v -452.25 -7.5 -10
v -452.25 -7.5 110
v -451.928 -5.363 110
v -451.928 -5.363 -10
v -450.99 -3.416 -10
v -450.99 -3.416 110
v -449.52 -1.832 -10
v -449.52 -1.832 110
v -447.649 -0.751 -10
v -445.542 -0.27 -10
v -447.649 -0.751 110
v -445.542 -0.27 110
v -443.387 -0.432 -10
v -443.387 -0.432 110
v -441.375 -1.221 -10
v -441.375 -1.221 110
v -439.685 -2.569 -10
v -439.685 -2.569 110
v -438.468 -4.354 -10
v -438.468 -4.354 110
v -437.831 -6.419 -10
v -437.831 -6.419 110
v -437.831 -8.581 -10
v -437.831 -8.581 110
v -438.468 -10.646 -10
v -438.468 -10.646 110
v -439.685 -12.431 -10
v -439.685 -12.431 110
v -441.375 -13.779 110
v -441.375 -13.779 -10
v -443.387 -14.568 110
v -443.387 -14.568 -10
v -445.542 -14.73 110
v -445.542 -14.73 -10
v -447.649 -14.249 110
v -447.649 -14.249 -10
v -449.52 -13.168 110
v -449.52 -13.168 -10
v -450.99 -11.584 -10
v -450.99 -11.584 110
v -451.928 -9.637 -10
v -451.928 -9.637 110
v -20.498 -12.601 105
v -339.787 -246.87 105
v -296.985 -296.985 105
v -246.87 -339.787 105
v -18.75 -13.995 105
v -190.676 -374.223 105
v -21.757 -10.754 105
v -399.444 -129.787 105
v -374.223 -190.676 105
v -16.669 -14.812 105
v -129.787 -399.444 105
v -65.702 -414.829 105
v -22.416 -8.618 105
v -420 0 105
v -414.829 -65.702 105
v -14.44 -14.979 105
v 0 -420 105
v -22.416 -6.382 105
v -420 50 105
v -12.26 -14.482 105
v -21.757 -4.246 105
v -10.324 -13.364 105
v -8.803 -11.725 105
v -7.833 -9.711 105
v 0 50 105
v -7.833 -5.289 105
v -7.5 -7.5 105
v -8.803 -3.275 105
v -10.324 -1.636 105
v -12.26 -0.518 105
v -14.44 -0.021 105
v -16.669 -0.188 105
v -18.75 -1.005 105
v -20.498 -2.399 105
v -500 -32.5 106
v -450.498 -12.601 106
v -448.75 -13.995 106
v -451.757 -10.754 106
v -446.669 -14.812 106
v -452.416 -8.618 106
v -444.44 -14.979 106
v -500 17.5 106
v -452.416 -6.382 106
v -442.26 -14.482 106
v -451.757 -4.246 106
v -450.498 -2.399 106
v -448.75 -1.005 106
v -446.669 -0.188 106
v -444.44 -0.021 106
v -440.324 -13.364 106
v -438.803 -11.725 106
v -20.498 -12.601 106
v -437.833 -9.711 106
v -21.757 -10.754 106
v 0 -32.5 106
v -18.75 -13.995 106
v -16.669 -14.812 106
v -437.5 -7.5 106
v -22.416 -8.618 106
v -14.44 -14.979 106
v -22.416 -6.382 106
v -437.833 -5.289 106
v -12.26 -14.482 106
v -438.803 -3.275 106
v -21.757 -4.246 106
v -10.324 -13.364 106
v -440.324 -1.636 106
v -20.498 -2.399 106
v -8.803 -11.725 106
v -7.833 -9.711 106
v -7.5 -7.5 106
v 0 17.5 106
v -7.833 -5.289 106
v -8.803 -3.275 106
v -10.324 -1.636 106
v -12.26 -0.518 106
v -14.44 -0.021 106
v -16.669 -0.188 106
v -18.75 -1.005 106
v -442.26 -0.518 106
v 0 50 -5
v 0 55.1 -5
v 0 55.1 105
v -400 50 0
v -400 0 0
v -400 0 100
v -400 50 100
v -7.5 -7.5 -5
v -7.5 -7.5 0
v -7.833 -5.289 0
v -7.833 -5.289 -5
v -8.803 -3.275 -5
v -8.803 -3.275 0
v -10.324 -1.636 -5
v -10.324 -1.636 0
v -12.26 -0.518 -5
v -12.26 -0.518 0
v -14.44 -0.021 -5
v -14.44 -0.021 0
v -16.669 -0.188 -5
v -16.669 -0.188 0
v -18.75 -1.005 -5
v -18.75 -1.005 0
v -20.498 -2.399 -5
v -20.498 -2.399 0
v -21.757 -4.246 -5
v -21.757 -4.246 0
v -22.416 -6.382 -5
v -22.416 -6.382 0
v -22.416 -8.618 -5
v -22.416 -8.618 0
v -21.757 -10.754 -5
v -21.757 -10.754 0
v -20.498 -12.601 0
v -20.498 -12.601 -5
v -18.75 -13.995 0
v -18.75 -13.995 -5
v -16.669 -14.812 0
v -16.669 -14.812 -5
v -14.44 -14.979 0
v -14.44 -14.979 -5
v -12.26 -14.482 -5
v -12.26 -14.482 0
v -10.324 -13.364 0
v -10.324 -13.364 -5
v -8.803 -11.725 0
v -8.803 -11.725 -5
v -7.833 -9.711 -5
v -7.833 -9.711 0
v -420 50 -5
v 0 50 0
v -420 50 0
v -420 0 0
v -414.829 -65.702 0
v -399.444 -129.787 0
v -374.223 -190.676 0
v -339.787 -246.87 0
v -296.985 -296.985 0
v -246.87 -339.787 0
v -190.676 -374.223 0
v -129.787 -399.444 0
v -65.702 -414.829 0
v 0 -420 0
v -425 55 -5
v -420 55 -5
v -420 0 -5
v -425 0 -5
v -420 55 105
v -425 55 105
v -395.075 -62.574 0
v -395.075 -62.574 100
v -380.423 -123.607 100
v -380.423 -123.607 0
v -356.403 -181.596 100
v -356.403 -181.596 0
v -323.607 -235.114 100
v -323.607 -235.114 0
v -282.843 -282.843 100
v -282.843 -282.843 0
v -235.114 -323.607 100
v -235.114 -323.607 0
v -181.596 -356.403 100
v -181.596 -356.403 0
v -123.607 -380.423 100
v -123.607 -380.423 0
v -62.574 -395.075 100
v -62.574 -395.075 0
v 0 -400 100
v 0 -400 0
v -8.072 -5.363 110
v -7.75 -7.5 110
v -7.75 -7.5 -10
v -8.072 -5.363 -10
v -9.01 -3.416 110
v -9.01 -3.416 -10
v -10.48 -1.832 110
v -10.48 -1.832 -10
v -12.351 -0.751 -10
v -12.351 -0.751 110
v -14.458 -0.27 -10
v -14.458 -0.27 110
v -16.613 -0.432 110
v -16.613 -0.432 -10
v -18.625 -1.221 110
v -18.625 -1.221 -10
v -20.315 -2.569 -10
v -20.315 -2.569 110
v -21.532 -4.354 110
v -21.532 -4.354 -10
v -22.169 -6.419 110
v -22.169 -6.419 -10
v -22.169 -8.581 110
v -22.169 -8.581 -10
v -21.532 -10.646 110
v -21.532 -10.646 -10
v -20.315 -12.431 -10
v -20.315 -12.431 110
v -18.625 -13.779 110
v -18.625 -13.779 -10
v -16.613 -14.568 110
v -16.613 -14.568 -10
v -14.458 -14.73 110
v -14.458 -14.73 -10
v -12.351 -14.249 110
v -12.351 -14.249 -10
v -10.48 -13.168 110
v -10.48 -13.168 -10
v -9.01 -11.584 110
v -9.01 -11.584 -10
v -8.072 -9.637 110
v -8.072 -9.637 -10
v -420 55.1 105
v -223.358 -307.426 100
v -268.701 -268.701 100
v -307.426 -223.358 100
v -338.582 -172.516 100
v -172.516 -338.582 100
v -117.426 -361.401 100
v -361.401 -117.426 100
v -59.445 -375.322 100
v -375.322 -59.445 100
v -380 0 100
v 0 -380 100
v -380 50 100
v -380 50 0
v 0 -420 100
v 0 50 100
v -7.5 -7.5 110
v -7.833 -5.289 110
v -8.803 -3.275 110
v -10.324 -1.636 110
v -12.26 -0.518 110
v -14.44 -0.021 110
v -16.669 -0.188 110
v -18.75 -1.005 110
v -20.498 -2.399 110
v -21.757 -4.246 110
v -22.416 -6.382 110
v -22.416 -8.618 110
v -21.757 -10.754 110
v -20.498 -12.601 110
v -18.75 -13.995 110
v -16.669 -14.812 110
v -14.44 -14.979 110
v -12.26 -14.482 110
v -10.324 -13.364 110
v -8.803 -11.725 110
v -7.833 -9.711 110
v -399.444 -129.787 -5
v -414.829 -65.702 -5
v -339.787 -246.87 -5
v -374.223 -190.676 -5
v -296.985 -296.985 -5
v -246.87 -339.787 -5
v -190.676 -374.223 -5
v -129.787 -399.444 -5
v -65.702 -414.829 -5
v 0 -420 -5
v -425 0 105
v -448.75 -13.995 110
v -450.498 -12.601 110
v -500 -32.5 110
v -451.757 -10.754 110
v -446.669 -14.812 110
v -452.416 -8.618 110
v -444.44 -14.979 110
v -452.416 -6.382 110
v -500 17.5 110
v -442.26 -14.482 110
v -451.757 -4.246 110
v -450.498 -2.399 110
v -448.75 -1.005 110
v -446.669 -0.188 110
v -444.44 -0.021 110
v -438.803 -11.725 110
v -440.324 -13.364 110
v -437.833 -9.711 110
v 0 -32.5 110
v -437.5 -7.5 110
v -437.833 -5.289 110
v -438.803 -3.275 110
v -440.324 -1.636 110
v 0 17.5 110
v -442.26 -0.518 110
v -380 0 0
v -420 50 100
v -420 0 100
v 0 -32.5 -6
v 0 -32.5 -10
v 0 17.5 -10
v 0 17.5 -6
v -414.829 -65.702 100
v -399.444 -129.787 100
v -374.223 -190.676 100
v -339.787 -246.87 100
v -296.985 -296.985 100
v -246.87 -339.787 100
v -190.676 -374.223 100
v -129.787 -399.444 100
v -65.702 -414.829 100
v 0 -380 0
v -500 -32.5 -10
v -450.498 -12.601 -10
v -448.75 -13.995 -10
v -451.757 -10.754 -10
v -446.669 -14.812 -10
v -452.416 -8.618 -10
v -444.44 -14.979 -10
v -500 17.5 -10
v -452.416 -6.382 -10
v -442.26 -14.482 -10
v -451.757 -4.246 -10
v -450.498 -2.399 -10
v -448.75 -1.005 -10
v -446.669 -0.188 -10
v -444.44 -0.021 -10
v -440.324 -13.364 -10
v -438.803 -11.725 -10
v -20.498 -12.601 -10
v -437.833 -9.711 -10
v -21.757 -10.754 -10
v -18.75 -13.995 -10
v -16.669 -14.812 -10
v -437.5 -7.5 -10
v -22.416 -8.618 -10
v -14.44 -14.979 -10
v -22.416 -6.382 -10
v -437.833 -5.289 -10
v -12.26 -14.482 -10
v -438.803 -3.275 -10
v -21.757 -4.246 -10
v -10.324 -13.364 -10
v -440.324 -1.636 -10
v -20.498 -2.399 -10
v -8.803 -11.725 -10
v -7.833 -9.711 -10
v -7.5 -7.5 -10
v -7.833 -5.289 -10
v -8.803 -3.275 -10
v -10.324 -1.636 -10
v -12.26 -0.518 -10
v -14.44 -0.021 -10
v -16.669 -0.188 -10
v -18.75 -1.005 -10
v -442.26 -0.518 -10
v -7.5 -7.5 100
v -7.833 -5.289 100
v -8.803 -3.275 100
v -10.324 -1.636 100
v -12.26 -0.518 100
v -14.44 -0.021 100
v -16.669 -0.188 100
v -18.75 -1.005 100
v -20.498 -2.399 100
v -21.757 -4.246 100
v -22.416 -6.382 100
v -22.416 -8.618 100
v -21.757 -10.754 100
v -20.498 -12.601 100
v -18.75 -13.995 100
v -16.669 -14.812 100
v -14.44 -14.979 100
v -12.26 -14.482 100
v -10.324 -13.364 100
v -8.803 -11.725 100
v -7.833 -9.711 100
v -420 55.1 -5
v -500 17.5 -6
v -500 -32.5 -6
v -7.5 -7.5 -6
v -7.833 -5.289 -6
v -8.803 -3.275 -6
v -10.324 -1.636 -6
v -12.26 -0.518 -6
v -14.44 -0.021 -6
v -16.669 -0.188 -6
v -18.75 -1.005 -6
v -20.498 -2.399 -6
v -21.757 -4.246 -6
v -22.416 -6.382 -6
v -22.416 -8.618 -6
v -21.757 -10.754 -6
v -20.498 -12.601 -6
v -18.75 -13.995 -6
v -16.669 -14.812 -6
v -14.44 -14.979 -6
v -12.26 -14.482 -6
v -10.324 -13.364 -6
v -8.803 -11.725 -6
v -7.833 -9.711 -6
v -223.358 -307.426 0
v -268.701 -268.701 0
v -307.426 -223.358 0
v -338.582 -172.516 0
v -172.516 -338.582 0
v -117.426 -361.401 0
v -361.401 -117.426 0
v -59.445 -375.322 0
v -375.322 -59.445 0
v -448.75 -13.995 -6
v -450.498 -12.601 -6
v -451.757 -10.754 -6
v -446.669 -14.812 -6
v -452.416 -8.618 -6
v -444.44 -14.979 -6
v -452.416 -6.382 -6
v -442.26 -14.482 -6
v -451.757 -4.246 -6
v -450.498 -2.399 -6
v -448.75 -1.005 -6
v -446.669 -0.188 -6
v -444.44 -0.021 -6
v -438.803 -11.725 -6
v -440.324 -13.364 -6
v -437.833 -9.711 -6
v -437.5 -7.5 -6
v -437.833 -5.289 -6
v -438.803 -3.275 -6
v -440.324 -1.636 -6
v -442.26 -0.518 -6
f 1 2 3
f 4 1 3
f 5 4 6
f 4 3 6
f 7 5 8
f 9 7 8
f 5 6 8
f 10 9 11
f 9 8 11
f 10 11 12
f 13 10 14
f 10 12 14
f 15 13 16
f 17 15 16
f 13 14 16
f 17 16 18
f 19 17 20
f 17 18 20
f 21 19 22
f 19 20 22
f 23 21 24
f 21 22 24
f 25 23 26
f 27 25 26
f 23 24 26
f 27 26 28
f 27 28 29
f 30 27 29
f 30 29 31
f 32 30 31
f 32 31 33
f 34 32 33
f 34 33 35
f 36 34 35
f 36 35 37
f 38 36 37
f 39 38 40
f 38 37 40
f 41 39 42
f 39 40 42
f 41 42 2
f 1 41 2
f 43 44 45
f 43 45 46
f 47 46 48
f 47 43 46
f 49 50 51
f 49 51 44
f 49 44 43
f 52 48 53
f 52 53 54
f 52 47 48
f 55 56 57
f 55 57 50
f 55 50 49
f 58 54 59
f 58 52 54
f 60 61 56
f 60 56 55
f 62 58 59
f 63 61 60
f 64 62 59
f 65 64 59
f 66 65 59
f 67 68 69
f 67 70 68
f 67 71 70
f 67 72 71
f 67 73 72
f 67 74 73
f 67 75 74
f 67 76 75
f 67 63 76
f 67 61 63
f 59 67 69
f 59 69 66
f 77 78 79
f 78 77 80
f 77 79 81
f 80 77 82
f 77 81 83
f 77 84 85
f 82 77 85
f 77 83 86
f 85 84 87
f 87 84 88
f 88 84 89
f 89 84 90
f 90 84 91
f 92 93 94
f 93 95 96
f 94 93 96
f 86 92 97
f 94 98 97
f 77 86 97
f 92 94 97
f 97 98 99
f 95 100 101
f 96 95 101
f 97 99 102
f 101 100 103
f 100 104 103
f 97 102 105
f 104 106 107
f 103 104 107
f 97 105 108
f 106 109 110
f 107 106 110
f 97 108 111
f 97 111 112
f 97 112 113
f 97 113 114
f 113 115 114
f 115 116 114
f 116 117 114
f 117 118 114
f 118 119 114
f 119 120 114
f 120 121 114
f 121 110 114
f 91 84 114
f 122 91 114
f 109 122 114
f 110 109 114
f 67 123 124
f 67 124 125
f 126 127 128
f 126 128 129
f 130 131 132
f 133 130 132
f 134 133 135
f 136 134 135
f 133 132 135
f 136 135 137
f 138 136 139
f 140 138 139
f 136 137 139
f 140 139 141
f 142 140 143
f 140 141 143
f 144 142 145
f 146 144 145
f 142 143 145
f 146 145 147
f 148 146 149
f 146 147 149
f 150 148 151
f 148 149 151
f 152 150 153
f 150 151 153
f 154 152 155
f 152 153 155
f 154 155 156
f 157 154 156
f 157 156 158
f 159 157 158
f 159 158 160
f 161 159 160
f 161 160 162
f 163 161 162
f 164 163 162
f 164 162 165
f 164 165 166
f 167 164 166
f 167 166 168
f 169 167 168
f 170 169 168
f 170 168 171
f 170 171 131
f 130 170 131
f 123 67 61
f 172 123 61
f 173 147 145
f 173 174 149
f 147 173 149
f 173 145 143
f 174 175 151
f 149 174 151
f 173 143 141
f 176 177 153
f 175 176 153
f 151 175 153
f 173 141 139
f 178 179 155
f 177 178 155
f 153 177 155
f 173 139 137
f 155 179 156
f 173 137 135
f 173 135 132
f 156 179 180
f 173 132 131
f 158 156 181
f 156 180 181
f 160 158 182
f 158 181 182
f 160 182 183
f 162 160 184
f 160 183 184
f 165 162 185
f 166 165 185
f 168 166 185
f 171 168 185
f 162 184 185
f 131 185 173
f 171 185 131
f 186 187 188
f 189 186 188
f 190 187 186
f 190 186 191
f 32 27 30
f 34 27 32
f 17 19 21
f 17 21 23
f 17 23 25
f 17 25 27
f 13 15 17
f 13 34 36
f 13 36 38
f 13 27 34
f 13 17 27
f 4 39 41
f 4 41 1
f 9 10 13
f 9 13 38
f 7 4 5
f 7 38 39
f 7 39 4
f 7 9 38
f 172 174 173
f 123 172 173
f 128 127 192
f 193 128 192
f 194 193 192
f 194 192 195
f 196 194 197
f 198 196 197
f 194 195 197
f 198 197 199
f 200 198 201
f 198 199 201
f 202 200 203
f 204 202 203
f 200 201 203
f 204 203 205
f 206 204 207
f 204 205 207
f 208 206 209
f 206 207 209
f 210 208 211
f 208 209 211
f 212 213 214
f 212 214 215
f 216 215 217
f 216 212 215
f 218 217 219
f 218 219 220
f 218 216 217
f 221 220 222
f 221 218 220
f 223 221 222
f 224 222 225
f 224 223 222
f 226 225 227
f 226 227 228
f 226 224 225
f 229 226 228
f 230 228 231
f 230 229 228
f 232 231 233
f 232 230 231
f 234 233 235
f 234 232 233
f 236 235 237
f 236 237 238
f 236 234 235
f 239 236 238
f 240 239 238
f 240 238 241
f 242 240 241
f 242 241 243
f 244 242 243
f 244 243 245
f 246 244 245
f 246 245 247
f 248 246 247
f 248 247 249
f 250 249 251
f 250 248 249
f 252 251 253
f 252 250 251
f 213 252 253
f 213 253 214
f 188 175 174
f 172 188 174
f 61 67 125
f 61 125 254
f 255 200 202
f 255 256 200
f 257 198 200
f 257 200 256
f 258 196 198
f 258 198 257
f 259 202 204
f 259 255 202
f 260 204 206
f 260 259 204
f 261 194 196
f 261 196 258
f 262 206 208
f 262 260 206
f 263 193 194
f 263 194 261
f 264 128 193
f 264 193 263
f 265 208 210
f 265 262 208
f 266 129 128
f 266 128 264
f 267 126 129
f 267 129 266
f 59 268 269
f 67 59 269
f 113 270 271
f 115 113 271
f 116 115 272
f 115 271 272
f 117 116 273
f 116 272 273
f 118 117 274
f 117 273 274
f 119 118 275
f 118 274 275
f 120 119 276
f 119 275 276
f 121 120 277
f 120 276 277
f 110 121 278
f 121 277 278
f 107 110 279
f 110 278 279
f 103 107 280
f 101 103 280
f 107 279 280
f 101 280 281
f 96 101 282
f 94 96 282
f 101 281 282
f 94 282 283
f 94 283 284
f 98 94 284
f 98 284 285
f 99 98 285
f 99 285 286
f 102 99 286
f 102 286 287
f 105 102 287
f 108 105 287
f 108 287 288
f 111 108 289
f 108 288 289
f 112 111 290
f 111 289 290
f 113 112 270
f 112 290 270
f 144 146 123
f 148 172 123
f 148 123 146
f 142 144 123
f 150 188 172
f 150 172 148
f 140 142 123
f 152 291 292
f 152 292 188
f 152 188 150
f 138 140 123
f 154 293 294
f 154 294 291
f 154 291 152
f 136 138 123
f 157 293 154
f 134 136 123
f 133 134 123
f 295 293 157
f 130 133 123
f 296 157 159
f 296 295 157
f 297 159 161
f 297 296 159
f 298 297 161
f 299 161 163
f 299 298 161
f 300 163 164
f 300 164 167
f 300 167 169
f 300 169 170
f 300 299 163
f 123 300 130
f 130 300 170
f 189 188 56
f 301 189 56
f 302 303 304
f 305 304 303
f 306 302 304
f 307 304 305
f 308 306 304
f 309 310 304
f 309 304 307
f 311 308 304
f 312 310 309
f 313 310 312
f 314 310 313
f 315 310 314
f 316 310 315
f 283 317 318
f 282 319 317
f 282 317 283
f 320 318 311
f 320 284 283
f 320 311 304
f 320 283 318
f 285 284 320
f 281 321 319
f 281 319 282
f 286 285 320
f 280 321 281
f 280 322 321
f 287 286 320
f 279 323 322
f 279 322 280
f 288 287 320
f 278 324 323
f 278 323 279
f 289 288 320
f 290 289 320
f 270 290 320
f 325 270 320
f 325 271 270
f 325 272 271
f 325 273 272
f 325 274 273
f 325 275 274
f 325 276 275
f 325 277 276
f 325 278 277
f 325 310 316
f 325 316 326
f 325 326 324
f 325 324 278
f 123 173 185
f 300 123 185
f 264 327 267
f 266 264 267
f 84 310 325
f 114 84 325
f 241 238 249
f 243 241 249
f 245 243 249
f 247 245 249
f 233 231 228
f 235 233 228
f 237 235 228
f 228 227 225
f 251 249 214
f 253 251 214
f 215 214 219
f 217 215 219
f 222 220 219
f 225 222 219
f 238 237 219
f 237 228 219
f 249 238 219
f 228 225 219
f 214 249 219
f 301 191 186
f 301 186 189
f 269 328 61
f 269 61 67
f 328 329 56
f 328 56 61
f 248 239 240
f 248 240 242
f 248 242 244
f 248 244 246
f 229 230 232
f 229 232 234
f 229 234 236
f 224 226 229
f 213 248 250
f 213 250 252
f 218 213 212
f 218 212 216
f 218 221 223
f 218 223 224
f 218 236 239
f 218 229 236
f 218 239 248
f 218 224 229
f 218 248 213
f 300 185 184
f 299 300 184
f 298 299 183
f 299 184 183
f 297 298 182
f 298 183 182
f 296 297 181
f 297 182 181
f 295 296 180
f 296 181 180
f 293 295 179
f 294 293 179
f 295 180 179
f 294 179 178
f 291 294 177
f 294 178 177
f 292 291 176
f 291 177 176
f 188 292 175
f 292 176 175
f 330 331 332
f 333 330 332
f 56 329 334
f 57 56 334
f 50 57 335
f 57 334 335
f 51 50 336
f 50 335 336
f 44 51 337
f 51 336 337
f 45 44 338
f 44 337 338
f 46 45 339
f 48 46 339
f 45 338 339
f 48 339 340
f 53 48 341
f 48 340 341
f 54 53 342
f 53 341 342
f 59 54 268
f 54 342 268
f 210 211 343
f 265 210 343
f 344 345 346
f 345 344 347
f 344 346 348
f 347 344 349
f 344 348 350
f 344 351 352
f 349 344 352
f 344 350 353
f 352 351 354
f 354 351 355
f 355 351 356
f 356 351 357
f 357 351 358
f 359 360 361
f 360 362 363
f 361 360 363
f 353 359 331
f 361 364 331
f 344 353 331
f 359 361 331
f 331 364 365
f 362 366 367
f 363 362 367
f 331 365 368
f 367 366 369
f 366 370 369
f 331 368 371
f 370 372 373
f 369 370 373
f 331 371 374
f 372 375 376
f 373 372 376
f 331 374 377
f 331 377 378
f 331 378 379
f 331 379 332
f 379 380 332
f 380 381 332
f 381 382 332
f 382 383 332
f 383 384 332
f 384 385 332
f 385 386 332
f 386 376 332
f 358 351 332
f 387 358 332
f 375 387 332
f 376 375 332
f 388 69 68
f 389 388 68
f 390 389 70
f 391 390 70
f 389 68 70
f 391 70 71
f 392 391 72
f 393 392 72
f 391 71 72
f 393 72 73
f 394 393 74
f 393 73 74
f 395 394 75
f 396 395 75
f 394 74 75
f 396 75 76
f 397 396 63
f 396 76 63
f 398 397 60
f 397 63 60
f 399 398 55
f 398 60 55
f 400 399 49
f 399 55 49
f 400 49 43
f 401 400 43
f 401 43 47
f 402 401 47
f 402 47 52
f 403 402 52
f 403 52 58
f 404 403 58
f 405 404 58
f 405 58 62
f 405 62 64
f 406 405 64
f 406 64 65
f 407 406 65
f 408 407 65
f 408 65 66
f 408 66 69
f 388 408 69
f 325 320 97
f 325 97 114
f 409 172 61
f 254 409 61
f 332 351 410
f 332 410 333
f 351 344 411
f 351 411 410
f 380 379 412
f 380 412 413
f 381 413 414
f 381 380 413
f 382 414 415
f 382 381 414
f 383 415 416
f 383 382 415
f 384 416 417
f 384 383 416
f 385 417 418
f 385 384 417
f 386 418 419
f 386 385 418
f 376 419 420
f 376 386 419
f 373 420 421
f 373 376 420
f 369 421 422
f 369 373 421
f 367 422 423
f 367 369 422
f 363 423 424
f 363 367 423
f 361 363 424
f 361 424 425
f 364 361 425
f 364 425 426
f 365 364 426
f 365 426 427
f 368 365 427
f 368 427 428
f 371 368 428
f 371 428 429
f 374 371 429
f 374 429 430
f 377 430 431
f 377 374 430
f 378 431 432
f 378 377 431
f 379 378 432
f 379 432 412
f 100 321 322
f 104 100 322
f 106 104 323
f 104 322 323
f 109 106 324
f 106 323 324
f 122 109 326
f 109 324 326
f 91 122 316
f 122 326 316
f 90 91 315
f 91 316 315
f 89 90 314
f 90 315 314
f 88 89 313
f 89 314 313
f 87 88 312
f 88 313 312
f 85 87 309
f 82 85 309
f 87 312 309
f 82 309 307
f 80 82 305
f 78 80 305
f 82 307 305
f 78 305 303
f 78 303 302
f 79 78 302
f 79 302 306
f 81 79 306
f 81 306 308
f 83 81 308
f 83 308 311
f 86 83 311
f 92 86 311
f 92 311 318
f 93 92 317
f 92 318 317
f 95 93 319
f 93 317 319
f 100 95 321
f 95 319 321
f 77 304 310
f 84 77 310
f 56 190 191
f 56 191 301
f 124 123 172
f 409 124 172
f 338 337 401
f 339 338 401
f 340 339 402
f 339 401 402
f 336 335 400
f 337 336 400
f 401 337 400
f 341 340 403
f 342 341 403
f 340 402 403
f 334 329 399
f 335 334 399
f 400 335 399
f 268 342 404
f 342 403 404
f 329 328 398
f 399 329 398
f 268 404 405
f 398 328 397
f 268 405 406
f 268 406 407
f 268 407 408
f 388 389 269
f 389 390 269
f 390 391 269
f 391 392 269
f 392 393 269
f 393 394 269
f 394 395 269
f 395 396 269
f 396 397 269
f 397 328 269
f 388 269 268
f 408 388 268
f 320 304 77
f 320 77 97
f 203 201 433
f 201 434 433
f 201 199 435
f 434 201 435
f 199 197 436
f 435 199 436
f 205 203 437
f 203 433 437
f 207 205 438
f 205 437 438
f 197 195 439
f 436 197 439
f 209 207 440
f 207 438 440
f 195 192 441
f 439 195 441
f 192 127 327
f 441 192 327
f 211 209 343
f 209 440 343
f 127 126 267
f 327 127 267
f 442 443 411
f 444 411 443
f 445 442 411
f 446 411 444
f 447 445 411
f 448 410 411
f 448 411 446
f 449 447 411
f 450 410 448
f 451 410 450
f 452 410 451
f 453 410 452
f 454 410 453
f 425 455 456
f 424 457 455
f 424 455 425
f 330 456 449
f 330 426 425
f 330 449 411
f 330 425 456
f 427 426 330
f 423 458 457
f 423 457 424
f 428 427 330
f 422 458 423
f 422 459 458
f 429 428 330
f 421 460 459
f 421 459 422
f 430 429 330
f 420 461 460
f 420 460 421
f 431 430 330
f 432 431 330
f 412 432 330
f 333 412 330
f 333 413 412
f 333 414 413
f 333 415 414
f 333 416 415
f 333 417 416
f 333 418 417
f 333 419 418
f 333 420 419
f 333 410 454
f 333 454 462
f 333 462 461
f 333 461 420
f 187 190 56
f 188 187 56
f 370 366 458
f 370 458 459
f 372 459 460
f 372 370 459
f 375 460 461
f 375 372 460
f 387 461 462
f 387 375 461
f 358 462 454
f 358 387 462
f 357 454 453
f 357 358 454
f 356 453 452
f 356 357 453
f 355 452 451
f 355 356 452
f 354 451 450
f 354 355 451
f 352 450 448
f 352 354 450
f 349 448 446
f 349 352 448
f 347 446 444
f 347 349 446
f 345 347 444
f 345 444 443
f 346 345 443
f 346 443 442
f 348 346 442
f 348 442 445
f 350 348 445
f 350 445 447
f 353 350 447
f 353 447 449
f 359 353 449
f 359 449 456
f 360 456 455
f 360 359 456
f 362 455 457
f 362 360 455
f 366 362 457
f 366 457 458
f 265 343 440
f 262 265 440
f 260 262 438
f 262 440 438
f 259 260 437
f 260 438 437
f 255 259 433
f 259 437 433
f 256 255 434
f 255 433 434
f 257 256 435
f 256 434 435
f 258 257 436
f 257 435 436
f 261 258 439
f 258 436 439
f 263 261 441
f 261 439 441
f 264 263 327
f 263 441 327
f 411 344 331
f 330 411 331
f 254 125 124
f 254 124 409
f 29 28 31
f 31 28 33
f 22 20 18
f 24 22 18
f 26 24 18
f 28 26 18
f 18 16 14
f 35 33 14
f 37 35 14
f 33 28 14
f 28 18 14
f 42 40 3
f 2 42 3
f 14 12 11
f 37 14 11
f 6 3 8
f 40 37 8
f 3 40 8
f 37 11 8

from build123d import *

# Parameters (mm, degrees)
F0_W      = 20
F0_H      = 50
F1_DEPTH  = 100
F4_DEPTH  = 5
F6_W      = 420
F6_H      = 50
F7_DEPTH  = 5
F9_W      = 420
F9_H      = 110
F10_DEPTH = 5.1
F11_R     = 7.5
F12_DEPTH = 110.001
F14_R     = 7.25
F15_DEPTH = 120
F17_W     = 500
F17_H     = 50
F17_R     = 7.5
F18_DEPTH = 4
F24_W     = 55
F24_H     = 110
F25_DEPTH = 5


with BuildPart() as f1:
    # F0 (on Top) → F1 (new body)
    with BuildSketch(Plane.XY):
        with BuildLine():
            ThreePointArc((0, -380), (-268.7005768509, -268.7005768509), (-380, 0))
            Line((-380, 0), (-400, 0))
            ThreePointArc((-400, 0), (-282.8427124746, -282.8427124746), (0, -400))
            Line((0, -400), (0, -380))
        make_face()
        with Locations((-390, 25)):
            Rectangle(F0_W, F0_H)
    extrude(amount=F1_DEPTH)


with BuildPart() as f4:
    # F3 (on offset) → F4 (new body)
    with BuildSketch(Plane(origin=(0, 0, 0), x_dir=(1, 0, 0), z_dir=(0, 0, -1))):
        with BuildLine():
            Line((-400, 0), (0, 0))
            Line((0, 0), (0, 400))
            ThreePointArc((0, 400), (-282.8427124746, 282.8427124746), (-400, 0))
        make_face()
        Polygon((0, -50), (0, 0), (-400, 0), (-420, 0), (-420, -50), align=None)
        with BuildLine():
            ThreePointArc((-400, 0), (-282.8427124746, 282.8427124746), (0, 400))
            Line((0, 400), (0, 420))
            ThreePointArc((0, 420), (-296.9848480984, 296.9848480984), (-420, 0))
            Line((-420, 0), (-400, 0))
        make_face()
    extrude(amount=F4_DEPTH)


with BuildPart() as f7:
    # F6 (on offset) → F7 (new body)
    with BuildSketch(Plane.XY.offset(100)):
        with BuildLine():
            Line((0, -420), (0, 0))
            Line((0, 0), (-420, 0))
            ThreePointArc((-420, 0), (-296.9848480984, -296.9848480984), (0, -420))
        make_face()
        with Locations((-210, 25)):
            Rectangle(F6_W, F6_H)
    extrude(amount=F7_DEPTH)


with BuildPart() as f10:
    # F9 (on offset) → F10 (new body)
    with BuildSketch(Plane(origin=(0, 50, 0), x_dir=(-1, 0, 0), z_dir=(0, 1, 0))):
        with Locations((210, 50)):
            Rectangle(F9_W, F9_H)
    extrude(amount=F10_DEPTH)


with BuildPart() as f12_tool:
    # F11 (on face) → F12 (new body, through all)
    with BuildSketch(Plane.XY.offset(105)):
        with Locations((-15, -7.5)):
            Circle(F11_R)
    extrude(amount=-F12_DEPTH)


with BuildPart() as f4_1:
    add(f4.part)

    # F12: cut by f12_tool
    add(f12_tool.part, mode=Mode.SUBTRACT)


with BuildPart() as f7_1:
    add(f7.part)

    # F12: cut by f12_tool
    add(f12_tool.part, mode=Mode.SUBTRACT)


with BuildPart() as f15:
    # F14 (on offset) → F15 (new body)
    with BuildSketch(Plane.XY.offset(110)):
        with Locations((-15, -7.5)):
            Circle(F14_R)
    extrude(amount=-F15_DEPTH)


with BuildPart() as f18:
    # F17 (on offset) → F18 (new body)
    with BuildSketch(Plane.XY.offset(110)):
        with Locations((-250, -7.5)):
            Rectangle(F17_W, F17_H)
        with Locations((-445, -7.5)):
            Circle(F17_R, mode=Mode.SUBTRACT)
        with Locations((-15, -7.5)):
            Circle(F17_R, mode=Mode.SUBTRACT)
    extrude(amount=-F18_DEPTH)


with BuildPart() as f20_1:
    # F20: instance of F18
    add(f18.part.mirror(Plane(origin=(-259.0259524442, -227.7104241093, 50), x_dir=(1, 0, 0), z_dir=(0, 0, 1))))


with BuildPart() as f22_1:
    # F22: instance of F15
    add(f15.part.mirror(Plane(origin=(-230, -185, 102.5), x_dir=(0, 1, 0), z_dir=(1, 0, 0))))


with BuildPart() as f25:
    # F24 (on offset) → F25 (new body)
    with BuildSketch(Plane(origin=(-420, 0, 0), x_dir=(0, -1, 0), z_dir=(-1, 0, 0))):
        with Locations((-27.5, 50)):
            Rectangle(F24_W, F24_H)
    extrude(amount=F25_DEPTH)


solid = Compound([f1.part, f10.part, f4_1.part, f7_1.part, f15.part, f18.part, f20_1.part, f22_1.part, f25.part])
